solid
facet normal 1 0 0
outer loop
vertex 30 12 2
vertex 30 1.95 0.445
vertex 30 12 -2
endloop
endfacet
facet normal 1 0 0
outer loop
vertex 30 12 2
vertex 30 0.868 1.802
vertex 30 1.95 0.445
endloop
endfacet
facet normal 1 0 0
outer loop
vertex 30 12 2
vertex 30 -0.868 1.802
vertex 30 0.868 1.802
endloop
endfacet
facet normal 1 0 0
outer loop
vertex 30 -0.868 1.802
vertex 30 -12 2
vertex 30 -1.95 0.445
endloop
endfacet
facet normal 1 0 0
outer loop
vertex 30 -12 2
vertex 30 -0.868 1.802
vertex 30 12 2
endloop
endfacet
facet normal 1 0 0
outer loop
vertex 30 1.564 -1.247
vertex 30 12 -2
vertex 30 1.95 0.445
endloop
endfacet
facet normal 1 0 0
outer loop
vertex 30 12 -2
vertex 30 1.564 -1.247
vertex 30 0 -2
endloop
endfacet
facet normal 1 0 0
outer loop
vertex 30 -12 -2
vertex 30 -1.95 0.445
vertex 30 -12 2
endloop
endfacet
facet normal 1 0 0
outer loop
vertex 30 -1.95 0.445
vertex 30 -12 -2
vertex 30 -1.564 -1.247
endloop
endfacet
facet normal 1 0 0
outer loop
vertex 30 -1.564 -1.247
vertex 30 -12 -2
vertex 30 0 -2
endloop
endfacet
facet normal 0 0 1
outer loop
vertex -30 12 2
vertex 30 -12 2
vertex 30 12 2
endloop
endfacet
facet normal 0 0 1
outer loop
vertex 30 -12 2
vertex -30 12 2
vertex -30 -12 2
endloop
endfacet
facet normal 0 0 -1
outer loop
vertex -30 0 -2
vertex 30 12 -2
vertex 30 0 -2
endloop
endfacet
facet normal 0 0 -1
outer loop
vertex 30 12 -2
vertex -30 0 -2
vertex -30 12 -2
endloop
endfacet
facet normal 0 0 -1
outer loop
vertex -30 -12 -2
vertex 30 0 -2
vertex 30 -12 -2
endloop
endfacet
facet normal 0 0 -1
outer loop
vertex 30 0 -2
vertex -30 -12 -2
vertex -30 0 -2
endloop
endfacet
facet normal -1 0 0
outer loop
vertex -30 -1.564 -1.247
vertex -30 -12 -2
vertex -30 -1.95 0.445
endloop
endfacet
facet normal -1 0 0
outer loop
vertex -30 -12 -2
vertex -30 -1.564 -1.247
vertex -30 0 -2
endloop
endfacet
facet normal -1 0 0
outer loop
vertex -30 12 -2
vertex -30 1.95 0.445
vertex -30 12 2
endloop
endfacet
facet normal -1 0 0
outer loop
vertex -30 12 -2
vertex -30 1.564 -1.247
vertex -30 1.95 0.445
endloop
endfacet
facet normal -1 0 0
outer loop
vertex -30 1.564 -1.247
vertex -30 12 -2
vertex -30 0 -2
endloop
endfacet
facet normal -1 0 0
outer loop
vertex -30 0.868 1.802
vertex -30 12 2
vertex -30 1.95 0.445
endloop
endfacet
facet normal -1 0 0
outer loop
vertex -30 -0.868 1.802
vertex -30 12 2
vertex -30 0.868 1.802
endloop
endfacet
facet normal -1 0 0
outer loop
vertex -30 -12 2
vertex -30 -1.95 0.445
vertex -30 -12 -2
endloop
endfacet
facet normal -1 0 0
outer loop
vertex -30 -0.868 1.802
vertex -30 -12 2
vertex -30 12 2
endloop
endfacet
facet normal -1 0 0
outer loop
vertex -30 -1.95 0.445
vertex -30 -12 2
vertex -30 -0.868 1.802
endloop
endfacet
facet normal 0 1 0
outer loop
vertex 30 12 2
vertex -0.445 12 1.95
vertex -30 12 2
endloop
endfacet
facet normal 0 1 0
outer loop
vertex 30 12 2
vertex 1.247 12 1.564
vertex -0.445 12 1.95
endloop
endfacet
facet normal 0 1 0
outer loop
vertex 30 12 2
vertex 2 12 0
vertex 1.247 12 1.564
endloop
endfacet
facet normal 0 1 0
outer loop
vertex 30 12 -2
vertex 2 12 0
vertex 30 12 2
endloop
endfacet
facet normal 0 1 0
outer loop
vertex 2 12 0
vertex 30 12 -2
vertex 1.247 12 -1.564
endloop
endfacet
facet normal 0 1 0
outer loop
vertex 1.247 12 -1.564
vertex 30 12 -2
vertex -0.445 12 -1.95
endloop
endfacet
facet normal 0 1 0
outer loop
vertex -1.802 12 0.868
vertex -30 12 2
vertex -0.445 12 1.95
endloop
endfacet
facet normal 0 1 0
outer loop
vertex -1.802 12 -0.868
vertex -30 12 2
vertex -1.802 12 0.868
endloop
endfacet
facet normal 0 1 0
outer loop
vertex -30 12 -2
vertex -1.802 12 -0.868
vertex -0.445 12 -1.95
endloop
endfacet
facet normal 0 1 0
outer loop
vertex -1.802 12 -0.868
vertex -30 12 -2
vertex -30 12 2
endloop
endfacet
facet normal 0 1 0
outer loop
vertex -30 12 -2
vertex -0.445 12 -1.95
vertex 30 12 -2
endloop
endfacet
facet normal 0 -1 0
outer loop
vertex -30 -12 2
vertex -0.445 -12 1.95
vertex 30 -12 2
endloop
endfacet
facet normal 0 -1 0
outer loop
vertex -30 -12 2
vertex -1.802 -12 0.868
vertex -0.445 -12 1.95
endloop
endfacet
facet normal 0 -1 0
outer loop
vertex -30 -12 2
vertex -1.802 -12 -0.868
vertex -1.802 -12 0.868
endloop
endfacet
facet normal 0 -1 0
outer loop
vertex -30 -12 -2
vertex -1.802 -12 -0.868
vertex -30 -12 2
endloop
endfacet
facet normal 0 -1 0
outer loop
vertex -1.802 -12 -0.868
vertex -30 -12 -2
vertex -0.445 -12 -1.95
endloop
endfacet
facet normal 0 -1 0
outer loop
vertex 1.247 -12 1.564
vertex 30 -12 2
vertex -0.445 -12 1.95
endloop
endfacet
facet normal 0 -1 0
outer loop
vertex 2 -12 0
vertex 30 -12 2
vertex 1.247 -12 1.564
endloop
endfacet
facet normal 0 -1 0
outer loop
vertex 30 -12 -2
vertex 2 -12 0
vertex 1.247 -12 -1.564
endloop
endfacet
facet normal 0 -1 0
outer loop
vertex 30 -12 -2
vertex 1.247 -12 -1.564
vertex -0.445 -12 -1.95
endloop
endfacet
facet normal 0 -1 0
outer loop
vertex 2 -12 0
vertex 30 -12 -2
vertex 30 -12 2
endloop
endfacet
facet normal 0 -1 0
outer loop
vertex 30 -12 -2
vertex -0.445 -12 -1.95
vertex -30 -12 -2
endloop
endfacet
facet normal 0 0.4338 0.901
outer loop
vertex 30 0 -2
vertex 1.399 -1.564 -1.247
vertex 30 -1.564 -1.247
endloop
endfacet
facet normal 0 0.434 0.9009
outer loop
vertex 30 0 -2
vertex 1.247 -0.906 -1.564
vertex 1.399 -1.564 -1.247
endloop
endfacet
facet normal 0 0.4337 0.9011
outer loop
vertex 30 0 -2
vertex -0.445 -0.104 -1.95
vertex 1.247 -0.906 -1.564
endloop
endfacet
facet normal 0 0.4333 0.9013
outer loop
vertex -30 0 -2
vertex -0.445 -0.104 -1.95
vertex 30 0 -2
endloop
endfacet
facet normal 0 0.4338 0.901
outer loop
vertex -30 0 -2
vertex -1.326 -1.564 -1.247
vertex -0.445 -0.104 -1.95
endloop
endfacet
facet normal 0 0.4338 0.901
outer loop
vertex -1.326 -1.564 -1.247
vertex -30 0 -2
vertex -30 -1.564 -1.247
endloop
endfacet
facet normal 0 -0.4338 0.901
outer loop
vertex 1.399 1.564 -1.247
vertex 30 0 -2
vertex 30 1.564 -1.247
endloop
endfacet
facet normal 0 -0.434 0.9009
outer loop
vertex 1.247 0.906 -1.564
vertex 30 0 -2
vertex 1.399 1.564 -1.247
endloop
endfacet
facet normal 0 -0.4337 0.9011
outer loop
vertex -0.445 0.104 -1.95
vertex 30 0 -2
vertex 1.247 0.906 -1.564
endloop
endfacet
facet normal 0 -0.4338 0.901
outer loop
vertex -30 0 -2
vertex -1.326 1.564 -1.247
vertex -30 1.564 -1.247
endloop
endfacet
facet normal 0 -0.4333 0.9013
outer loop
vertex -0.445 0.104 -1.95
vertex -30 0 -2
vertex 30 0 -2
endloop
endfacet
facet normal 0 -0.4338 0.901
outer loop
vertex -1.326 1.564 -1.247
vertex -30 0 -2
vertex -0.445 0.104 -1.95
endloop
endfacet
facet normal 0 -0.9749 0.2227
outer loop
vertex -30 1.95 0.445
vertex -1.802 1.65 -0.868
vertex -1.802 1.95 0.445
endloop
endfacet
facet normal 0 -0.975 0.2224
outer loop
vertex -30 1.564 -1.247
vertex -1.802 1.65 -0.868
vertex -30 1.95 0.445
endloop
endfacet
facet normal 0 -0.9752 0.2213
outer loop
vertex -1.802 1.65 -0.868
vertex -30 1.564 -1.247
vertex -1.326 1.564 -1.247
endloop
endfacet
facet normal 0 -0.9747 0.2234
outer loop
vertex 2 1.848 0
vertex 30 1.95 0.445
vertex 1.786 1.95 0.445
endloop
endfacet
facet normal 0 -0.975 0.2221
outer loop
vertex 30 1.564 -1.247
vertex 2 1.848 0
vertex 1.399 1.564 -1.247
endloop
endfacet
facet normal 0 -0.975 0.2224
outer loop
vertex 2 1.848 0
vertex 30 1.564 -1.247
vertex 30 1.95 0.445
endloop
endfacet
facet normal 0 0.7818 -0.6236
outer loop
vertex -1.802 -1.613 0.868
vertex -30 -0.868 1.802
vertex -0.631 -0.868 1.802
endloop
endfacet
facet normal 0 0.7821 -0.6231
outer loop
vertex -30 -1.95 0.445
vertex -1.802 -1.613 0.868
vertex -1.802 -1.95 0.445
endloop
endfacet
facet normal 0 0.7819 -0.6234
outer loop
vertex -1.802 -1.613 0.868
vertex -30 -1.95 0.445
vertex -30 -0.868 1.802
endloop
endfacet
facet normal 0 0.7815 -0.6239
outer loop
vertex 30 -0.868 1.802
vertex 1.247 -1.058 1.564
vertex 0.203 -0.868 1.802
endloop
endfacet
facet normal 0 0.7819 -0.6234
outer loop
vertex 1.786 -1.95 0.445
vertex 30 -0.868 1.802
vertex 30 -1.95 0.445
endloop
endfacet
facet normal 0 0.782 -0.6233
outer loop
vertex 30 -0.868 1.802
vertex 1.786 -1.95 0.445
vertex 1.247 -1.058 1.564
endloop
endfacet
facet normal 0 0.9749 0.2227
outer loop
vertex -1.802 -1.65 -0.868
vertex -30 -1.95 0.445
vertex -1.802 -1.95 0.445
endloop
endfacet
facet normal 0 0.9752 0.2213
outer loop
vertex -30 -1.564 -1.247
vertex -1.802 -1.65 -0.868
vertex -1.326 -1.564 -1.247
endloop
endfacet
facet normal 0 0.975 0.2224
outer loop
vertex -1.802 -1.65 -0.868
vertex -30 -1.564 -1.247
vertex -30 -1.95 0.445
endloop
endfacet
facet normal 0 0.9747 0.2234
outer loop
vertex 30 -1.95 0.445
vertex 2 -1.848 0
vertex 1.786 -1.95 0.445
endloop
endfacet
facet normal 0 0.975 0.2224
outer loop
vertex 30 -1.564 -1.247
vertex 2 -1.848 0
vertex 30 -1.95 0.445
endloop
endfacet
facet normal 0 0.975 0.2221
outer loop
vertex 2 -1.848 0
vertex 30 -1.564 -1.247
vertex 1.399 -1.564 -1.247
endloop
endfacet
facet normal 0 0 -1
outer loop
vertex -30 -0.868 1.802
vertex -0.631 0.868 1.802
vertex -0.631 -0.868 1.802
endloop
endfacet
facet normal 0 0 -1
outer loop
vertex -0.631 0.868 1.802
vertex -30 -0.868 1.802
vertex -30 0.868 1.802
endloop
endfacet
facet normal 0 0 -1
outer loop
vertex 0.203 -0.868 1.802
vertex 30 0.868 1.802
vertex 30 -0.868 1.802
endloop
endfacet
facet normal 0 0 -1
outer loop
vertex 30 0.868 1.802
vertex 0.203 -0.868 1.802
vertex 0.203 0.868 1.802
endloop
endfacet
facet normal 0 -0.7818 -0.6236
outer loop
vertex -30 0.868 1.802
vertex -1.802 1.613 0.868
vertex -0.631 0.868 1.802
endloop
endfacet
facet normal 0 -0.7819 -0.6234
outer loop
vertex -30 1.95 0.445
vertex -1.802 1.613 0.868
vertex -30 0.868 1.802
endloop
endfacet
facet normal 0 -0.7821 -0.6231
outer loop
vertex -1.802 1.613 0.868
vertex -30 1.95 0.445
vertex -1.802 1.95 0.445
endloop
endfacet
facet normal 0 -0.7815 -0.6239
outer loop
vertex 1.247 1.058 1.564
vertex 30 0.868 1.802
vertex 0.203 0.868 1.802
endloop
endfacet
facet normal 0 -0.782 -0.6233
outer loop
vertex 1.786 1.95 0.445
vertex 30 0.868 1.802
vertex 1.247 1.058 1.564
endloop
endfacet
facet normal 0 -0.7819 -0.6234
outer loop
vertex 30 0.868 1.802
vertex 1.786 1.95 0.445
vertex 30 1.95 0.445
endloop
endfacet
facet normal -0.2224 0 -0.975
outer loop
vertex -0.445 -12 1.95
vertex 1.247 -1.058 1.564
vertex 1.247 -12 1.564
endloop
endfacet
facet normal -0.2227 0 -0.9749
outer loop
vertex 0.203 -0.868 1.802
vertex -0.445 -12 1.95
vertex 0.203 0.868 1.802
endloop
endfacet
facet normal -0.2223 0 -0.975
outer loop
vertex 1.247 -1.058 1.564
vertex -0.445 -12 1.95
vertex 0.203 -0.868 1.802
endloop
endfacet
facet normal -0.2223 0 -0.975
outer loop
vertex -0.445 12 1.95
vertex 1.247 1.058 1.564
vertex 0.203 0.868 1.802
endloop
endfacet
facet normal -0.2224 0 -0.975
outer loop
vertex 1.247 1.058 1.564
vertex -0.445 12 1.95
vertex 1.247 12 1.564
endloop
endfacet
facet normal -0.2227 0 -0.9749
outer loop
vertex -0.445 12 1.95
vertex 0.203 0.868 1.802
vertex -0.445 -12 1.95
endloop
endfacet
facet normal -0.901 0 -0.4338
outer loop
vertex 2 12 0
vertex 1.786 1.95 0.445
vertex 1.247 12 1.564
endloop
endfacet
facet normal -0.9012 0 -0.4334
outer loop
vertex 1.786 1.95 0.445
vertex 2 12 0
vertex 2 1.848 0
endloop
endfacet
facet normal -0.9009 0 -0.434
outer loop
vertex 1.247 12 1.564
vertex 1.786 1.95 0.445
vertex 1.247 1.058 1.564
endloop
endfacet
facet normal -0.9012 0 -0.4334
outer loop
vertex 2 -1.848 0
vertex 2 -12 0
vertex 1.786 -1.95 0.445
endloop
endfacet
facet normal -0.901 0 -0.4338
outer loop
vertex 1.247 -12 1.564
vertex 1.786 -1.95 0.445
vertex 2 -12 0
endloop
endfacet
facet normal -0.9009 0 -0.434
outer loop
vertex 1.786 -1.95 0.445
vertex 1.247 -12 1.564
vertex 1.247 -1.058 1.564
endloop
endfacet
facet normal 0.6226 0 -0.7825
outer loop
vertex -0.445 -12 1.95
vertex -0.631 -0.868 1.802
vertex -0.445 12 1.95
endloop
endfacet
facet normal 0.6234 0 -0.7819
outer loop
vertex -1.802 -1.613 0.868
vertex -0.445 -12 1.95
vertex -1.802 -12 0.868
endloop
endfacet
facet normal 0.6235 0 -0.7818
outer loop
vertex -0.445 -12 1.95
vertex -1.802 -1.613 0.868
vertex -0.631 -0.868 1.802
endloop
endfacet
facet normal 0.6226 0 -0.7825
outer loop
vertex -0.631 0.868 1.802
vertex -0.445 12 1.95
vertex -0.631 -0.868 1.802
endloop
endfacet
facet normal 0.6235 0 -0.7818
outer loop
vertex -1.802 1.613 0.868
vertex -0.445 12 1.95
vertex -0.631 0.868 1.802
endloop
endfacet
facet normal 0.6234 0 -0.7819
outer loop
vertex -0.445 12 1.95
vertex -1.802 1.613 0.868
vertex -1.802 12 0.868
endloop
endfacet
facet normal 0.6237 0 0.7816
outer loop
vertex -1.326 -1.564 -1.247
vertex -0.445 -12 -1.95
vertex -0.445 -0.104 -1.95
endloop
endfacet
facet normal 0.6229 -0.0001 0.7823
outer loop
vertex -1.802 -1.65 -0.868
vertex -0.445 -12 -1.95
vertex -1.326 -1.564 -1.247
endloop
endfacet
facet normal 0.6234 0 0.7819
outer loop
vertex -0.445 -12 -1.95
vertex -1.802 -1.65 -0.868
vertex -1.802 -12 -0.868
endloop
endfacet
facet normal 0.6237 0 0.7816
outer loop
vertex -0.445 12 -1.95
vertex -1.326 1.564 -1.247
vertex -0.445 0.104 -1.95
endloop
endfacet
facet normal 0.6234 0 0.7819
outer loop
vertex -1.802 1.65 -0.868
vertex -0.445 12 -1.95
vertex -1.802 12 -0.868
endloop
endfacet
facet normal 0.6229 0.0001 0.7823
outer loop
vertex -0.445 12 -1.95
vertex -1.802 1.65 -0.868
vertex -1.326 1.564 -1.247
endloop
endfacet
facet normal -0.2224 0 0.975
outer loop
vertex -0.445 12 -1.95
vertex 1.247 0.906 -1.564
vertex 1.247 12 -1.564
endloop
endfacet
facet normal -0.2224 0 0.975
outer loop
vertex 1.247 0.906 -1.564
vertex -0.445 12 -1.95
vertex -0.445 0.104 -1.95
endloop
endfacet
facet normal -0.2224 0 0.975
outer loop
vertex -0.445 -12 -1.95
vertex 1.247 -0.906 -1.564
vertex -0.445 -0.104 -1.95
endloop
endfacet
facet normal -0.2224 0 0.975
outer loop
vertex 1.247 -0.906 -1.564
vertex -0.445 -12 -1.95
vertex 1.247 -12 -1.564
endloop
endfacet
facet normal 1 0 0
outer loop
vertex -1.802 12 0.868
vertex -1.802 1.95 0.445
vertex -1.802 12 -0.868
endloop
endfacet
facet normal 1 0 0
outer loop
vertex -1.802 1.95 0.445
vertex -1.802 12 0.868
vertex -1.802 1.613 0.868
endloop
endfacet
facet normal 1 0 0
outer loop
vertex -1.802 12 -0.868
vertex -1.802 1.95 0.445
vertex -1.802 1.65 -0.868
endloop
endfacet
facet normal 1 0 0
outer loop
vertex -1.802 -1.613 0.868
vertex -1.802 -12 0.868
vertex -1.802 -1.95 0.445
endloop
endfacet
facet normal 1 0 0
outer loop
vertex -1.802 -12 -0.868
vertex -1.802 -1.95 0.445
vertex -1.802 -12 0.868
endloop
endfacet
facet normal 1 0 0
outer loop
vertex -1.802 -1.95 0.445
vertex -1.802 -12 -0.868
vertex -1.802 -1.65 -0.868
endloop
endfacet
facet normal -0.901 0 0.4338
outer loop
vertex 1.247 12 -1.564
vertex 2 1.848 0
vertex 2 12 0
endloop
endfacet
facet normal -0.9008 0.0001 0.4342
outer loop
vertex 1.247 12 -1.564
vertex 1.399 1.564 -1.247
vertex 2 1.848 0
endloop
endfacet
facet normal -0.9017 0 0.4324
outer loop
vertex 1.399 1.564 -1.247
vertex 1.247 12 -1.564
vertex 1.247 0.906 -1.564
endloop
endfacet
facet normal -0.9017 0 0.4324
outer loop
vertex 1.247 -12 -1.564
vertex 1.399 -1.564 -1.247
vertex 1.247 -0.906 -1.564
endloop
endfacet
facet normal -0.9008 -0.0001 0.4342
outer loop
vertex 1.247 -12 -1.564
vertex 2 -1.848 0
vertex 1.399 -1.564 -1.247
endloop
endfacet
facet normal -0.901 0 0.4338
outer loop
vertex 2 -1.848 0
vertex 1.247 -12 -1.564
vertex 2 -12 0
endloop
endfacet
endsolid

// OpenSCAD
// Rectangular plate with cylindrical holes
difference() {
    // Main plate
    cube([60, 24, 4], center = true);
    
    // First cylindrical hole along X axis
    translate([0, 0, 0])
        rotate([0, 90, 0])
            cylinder(h = 62, d = 4, center = true);
    
    // Second cylindrical hole along Z axis
    translate([0, 0, 0])
        rotate([90, 0, 0])
            cylinder(h = 24, d = 4, center = true);
}
